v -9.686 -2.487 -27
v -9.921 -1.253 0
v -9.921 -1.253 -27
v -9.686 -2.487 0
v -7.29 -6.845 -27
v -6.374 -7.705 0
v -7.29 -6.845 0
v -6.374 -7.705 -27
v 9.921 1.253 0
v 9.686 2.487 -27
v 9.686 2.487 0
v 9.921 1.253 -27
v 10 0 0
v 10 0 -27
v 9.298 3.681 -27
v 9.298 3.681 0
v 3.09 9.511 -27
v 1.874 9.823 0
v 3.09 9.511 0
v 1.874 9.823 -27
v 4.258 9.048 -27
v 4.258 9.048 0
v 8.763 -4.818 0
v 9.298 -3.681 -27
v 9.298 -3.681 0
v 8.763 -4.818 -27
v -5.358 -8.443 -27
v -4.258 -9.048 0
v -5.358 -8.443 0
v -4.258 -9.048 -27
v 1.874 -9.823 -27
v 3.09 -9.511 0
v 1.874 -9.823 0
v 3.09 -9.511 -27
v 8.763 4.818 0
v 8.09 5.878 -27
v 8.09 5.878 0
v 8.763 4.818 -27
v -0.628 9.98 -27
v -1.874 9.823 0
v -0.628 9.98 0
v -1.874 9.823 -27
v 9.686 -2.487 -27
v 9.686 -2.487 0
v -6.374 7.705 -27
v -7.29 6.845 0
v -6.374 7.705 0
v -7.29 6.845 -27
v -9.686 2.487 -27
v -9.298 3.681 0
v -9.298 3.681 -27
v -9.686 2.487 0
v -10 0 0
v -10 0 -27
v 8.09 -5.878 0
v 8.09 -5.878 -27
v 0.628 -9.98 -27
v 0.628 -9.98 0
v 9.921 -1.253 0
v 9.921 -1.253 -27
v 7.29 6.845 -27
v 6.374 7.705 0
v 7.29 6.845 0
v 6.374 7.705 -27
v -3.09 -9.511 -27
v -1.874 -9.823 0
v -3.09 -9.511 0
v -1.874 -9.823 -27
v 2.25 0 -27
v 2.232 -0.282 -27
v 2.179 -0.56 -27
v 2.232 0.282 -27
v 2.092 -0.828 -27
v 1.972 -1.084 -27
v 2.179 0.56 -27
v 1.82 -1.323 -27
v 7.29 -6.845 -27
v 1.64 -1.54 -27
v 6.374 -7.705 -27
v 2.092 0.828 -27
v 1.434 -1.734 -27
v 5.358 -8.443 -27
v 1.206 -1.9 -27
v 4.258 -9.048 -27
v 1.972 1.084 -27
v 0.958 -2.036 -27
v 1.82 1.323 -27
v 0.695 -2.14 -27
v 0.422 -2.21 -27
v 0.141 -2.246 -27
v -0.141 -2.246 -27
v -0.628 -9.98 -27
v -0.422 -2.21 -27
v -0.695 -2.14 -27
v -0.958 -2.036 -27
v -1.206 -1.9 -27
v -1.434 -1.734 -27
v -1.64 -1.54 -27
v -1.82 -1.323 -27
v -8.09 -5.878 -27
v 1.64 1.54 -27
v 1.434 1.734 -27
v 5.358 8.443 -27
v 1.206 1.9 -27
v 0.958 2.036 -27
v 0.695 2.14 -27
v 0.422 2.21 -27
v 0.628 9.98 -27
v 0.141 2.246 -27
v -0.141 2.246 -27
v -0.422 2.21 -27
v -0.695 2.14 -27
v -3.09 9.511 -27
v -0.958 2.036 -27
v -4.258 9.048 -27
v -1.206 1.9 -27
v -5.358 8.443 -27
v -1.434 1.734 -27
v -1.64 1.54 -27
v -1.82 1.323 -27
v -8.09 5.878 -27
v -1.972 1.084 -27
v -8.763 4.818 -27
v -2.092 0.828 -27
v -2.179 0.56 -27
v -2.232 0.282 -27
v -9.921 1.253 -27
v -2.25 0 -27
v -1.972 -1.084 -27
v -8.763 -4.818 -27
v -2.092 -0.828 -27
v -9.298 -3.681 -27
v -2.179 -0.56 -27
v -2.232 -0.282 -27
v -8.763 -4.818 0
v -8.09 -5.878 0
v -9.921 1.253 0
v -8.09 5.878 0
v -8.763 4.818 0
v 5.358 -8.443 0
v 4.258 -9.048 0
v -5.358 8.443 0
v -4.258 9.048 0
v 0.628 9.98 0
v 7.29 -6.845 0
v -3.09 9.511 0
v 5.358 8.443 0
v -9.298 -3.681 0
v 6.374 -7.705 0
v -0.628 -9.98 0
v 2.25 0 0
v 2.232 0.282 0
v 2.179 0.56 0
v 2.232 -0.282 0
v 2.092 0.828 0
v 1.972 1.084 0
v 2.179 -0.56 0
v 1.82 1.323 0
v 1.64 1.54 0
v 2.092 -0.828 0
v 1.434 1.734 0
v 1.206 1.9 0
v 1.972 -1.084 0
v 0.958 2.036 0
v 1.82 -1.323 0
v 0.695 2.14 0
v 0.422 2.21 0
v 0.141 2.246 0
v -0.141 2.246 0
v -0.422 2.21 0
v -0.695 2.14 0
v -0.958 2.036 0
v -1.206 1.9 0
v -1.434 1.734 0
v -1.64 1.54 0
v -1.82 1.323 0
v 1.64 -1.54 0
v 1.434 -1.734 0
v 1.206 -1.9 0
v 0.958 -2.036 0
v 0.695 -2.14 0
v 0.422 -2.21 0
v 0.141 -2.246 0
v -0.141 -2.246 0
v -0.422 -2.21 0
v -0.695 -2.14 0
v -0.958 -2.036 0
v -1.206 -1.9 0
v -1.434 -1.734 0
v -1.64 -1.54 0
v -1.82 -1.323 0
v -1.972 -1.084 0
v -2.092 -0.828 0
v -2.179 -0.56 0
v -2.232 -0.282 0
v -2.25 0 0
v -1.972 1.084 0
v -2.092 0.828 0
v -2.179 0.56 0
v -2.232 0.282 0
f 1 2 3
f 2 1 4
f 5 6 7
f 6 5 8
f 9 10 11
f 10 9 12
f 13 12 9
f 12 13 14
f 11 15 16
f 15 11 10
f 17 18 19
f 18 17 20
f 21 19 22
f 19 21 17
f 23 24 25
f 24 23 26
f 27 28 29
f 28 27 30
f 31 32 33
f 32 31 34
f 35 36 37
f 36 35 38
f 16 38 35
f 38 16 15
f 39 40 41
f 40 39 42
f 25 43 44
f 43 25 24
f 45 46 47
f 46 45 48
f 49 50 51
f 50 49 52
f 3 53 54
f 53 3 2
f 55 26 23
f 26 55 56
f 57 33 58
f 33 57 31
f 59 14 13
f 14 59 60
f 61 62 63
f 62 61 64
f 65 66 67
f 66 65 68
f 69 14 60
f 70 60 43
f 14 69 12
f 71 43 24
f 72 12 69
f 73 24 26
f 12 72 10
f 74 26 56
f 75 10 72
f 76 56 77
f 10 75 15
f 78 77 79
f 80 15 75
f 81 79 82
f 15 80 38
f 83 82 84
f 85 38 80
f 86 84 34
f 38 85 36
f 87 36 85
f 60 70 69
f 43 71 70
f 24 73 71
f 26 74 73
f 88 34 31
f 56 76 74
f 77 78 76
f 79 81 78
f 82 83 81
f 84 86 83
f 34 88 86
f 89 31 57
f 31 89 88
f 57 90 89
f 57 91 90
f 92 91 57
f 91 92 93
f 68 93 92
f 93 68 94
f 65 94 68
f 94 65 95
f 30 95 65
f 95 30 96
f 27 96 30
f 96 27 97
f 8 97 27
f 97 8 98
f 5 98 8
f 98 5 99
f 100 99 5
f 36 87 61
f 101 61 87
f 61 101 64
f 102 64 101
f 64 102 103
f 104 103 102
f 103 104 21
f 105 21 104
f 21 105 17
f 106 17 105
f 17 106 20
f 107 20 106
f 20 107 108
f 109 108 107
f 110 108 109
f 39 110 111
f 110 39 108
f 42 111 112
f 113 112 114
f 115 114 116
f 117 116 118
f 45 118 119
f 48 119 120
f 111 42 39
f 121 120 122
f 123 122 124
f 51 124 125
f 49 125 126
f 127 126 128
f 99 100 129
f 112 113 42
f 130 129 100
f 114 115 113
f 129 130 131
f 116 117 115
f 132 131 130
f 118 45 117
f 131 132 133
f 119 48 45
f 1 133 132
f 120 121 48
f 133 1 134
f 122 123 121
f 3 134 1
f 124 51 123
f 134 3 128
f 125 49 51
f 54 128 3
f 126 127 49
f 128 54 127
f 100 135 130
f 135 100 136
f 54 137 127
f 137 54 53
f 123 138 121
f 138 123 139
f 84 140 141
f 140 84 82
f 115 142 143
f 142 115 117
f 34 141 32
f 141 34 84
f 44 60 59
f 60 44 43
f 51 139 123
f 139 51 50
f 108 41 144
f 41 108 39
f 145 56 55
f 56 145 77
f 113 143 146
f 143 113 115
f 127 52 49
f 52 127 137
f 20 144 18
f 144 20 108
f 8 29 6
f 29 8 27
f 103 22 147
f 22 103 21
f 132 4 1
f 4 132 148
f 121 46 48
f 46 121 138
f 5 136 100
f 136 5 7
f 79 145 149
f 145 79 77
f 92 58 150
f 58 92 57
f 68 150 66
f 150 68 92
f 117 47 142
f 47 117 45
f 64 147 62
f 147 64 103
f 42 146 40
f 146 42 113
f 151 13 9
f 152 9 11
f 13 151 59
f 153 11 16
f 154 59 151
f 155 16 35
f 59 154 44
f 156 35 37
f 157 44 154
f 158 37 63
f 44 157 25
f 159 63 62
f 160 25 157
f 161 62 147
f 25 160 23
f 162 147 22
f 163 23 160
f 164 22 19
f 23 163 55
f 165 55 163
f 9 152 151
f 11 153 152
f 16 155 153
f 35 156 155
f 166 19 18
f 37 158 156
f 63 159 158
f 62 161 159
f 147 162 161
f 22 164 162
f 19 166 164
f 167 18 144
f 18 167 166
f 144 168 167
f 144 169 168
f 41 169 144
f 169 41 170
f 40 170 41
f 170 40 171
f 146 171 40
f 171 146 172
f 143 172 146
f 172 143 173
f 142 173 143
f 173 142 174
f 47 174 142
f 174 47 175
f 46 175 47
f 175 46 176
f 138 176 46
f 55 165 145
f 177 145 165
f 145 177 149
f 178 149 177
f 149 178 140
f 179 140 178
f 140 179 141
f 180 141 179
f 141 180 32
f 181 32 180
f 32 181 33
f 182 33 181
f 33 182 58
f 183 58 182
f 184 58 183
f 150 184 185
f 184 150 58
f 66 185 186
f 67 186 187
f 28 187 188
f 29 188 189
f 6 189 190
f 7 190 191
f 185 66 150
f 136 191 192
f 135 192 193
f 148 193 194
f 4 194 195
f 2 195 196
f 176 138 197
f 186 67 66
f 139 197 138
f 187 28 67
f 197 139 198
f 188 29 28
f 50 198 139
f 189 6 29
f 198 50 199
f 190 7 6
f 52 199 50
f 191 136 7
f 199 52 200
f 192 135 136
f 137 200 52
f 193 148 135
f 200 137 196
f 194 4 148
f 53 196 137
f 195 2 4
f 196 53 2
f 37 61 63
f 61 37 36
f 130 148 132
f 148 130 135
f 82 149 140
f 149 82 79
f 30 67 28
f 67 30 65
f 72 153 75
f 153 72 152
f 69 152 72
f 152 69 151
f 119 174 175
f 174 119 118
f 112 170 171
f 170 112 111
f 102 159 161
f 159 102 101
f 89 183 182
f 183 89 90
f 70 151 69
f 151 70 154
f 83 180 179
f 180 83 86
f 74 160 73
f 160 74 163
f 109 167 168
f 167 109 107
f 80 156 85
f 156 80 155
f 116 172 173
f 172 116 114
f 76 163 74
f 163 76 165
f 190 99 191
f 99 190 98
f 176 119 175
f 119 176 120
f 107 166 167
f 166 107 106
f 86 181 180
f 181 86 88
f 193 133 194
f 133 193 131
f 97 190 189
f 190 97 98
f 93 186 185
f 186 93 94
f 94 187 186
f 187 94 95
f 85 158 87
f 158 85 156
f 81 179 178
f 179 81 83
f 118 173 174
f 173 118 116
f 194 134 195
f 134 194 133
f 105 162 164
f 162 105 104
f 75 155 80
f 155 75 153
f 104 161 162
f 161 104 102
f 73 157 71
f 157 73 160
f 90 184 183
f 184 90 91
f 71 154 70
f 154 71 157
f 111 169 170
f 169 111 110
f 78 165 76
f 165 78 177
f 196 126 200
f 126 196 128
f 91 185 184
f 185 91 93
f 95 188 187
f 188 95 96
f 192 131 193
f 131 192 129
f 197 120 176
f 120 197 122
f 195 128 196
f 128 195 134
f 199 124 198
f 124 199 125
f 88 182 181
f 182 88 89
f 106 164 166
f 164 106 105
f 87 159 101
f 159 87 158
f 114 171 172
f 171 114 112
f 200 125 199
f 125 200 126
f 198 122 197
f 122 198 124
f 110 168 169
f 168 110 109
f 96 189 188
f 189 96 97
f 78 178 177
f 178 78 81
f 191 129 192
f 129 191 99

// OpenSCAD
$fn = 50;


difference() {
	union() {
		translate(v = [0, 0, -27.0000000000]) {
			cylinder(h = 27, r = 10.0000000000);
		}
		cylinder(h = 0, r = 20.0000000000);
	}
	union() {
		#translate(v = [0, 0, -27]) {
			cylinder(h = 27, r = 2.2500000000);
		}
	}
}
